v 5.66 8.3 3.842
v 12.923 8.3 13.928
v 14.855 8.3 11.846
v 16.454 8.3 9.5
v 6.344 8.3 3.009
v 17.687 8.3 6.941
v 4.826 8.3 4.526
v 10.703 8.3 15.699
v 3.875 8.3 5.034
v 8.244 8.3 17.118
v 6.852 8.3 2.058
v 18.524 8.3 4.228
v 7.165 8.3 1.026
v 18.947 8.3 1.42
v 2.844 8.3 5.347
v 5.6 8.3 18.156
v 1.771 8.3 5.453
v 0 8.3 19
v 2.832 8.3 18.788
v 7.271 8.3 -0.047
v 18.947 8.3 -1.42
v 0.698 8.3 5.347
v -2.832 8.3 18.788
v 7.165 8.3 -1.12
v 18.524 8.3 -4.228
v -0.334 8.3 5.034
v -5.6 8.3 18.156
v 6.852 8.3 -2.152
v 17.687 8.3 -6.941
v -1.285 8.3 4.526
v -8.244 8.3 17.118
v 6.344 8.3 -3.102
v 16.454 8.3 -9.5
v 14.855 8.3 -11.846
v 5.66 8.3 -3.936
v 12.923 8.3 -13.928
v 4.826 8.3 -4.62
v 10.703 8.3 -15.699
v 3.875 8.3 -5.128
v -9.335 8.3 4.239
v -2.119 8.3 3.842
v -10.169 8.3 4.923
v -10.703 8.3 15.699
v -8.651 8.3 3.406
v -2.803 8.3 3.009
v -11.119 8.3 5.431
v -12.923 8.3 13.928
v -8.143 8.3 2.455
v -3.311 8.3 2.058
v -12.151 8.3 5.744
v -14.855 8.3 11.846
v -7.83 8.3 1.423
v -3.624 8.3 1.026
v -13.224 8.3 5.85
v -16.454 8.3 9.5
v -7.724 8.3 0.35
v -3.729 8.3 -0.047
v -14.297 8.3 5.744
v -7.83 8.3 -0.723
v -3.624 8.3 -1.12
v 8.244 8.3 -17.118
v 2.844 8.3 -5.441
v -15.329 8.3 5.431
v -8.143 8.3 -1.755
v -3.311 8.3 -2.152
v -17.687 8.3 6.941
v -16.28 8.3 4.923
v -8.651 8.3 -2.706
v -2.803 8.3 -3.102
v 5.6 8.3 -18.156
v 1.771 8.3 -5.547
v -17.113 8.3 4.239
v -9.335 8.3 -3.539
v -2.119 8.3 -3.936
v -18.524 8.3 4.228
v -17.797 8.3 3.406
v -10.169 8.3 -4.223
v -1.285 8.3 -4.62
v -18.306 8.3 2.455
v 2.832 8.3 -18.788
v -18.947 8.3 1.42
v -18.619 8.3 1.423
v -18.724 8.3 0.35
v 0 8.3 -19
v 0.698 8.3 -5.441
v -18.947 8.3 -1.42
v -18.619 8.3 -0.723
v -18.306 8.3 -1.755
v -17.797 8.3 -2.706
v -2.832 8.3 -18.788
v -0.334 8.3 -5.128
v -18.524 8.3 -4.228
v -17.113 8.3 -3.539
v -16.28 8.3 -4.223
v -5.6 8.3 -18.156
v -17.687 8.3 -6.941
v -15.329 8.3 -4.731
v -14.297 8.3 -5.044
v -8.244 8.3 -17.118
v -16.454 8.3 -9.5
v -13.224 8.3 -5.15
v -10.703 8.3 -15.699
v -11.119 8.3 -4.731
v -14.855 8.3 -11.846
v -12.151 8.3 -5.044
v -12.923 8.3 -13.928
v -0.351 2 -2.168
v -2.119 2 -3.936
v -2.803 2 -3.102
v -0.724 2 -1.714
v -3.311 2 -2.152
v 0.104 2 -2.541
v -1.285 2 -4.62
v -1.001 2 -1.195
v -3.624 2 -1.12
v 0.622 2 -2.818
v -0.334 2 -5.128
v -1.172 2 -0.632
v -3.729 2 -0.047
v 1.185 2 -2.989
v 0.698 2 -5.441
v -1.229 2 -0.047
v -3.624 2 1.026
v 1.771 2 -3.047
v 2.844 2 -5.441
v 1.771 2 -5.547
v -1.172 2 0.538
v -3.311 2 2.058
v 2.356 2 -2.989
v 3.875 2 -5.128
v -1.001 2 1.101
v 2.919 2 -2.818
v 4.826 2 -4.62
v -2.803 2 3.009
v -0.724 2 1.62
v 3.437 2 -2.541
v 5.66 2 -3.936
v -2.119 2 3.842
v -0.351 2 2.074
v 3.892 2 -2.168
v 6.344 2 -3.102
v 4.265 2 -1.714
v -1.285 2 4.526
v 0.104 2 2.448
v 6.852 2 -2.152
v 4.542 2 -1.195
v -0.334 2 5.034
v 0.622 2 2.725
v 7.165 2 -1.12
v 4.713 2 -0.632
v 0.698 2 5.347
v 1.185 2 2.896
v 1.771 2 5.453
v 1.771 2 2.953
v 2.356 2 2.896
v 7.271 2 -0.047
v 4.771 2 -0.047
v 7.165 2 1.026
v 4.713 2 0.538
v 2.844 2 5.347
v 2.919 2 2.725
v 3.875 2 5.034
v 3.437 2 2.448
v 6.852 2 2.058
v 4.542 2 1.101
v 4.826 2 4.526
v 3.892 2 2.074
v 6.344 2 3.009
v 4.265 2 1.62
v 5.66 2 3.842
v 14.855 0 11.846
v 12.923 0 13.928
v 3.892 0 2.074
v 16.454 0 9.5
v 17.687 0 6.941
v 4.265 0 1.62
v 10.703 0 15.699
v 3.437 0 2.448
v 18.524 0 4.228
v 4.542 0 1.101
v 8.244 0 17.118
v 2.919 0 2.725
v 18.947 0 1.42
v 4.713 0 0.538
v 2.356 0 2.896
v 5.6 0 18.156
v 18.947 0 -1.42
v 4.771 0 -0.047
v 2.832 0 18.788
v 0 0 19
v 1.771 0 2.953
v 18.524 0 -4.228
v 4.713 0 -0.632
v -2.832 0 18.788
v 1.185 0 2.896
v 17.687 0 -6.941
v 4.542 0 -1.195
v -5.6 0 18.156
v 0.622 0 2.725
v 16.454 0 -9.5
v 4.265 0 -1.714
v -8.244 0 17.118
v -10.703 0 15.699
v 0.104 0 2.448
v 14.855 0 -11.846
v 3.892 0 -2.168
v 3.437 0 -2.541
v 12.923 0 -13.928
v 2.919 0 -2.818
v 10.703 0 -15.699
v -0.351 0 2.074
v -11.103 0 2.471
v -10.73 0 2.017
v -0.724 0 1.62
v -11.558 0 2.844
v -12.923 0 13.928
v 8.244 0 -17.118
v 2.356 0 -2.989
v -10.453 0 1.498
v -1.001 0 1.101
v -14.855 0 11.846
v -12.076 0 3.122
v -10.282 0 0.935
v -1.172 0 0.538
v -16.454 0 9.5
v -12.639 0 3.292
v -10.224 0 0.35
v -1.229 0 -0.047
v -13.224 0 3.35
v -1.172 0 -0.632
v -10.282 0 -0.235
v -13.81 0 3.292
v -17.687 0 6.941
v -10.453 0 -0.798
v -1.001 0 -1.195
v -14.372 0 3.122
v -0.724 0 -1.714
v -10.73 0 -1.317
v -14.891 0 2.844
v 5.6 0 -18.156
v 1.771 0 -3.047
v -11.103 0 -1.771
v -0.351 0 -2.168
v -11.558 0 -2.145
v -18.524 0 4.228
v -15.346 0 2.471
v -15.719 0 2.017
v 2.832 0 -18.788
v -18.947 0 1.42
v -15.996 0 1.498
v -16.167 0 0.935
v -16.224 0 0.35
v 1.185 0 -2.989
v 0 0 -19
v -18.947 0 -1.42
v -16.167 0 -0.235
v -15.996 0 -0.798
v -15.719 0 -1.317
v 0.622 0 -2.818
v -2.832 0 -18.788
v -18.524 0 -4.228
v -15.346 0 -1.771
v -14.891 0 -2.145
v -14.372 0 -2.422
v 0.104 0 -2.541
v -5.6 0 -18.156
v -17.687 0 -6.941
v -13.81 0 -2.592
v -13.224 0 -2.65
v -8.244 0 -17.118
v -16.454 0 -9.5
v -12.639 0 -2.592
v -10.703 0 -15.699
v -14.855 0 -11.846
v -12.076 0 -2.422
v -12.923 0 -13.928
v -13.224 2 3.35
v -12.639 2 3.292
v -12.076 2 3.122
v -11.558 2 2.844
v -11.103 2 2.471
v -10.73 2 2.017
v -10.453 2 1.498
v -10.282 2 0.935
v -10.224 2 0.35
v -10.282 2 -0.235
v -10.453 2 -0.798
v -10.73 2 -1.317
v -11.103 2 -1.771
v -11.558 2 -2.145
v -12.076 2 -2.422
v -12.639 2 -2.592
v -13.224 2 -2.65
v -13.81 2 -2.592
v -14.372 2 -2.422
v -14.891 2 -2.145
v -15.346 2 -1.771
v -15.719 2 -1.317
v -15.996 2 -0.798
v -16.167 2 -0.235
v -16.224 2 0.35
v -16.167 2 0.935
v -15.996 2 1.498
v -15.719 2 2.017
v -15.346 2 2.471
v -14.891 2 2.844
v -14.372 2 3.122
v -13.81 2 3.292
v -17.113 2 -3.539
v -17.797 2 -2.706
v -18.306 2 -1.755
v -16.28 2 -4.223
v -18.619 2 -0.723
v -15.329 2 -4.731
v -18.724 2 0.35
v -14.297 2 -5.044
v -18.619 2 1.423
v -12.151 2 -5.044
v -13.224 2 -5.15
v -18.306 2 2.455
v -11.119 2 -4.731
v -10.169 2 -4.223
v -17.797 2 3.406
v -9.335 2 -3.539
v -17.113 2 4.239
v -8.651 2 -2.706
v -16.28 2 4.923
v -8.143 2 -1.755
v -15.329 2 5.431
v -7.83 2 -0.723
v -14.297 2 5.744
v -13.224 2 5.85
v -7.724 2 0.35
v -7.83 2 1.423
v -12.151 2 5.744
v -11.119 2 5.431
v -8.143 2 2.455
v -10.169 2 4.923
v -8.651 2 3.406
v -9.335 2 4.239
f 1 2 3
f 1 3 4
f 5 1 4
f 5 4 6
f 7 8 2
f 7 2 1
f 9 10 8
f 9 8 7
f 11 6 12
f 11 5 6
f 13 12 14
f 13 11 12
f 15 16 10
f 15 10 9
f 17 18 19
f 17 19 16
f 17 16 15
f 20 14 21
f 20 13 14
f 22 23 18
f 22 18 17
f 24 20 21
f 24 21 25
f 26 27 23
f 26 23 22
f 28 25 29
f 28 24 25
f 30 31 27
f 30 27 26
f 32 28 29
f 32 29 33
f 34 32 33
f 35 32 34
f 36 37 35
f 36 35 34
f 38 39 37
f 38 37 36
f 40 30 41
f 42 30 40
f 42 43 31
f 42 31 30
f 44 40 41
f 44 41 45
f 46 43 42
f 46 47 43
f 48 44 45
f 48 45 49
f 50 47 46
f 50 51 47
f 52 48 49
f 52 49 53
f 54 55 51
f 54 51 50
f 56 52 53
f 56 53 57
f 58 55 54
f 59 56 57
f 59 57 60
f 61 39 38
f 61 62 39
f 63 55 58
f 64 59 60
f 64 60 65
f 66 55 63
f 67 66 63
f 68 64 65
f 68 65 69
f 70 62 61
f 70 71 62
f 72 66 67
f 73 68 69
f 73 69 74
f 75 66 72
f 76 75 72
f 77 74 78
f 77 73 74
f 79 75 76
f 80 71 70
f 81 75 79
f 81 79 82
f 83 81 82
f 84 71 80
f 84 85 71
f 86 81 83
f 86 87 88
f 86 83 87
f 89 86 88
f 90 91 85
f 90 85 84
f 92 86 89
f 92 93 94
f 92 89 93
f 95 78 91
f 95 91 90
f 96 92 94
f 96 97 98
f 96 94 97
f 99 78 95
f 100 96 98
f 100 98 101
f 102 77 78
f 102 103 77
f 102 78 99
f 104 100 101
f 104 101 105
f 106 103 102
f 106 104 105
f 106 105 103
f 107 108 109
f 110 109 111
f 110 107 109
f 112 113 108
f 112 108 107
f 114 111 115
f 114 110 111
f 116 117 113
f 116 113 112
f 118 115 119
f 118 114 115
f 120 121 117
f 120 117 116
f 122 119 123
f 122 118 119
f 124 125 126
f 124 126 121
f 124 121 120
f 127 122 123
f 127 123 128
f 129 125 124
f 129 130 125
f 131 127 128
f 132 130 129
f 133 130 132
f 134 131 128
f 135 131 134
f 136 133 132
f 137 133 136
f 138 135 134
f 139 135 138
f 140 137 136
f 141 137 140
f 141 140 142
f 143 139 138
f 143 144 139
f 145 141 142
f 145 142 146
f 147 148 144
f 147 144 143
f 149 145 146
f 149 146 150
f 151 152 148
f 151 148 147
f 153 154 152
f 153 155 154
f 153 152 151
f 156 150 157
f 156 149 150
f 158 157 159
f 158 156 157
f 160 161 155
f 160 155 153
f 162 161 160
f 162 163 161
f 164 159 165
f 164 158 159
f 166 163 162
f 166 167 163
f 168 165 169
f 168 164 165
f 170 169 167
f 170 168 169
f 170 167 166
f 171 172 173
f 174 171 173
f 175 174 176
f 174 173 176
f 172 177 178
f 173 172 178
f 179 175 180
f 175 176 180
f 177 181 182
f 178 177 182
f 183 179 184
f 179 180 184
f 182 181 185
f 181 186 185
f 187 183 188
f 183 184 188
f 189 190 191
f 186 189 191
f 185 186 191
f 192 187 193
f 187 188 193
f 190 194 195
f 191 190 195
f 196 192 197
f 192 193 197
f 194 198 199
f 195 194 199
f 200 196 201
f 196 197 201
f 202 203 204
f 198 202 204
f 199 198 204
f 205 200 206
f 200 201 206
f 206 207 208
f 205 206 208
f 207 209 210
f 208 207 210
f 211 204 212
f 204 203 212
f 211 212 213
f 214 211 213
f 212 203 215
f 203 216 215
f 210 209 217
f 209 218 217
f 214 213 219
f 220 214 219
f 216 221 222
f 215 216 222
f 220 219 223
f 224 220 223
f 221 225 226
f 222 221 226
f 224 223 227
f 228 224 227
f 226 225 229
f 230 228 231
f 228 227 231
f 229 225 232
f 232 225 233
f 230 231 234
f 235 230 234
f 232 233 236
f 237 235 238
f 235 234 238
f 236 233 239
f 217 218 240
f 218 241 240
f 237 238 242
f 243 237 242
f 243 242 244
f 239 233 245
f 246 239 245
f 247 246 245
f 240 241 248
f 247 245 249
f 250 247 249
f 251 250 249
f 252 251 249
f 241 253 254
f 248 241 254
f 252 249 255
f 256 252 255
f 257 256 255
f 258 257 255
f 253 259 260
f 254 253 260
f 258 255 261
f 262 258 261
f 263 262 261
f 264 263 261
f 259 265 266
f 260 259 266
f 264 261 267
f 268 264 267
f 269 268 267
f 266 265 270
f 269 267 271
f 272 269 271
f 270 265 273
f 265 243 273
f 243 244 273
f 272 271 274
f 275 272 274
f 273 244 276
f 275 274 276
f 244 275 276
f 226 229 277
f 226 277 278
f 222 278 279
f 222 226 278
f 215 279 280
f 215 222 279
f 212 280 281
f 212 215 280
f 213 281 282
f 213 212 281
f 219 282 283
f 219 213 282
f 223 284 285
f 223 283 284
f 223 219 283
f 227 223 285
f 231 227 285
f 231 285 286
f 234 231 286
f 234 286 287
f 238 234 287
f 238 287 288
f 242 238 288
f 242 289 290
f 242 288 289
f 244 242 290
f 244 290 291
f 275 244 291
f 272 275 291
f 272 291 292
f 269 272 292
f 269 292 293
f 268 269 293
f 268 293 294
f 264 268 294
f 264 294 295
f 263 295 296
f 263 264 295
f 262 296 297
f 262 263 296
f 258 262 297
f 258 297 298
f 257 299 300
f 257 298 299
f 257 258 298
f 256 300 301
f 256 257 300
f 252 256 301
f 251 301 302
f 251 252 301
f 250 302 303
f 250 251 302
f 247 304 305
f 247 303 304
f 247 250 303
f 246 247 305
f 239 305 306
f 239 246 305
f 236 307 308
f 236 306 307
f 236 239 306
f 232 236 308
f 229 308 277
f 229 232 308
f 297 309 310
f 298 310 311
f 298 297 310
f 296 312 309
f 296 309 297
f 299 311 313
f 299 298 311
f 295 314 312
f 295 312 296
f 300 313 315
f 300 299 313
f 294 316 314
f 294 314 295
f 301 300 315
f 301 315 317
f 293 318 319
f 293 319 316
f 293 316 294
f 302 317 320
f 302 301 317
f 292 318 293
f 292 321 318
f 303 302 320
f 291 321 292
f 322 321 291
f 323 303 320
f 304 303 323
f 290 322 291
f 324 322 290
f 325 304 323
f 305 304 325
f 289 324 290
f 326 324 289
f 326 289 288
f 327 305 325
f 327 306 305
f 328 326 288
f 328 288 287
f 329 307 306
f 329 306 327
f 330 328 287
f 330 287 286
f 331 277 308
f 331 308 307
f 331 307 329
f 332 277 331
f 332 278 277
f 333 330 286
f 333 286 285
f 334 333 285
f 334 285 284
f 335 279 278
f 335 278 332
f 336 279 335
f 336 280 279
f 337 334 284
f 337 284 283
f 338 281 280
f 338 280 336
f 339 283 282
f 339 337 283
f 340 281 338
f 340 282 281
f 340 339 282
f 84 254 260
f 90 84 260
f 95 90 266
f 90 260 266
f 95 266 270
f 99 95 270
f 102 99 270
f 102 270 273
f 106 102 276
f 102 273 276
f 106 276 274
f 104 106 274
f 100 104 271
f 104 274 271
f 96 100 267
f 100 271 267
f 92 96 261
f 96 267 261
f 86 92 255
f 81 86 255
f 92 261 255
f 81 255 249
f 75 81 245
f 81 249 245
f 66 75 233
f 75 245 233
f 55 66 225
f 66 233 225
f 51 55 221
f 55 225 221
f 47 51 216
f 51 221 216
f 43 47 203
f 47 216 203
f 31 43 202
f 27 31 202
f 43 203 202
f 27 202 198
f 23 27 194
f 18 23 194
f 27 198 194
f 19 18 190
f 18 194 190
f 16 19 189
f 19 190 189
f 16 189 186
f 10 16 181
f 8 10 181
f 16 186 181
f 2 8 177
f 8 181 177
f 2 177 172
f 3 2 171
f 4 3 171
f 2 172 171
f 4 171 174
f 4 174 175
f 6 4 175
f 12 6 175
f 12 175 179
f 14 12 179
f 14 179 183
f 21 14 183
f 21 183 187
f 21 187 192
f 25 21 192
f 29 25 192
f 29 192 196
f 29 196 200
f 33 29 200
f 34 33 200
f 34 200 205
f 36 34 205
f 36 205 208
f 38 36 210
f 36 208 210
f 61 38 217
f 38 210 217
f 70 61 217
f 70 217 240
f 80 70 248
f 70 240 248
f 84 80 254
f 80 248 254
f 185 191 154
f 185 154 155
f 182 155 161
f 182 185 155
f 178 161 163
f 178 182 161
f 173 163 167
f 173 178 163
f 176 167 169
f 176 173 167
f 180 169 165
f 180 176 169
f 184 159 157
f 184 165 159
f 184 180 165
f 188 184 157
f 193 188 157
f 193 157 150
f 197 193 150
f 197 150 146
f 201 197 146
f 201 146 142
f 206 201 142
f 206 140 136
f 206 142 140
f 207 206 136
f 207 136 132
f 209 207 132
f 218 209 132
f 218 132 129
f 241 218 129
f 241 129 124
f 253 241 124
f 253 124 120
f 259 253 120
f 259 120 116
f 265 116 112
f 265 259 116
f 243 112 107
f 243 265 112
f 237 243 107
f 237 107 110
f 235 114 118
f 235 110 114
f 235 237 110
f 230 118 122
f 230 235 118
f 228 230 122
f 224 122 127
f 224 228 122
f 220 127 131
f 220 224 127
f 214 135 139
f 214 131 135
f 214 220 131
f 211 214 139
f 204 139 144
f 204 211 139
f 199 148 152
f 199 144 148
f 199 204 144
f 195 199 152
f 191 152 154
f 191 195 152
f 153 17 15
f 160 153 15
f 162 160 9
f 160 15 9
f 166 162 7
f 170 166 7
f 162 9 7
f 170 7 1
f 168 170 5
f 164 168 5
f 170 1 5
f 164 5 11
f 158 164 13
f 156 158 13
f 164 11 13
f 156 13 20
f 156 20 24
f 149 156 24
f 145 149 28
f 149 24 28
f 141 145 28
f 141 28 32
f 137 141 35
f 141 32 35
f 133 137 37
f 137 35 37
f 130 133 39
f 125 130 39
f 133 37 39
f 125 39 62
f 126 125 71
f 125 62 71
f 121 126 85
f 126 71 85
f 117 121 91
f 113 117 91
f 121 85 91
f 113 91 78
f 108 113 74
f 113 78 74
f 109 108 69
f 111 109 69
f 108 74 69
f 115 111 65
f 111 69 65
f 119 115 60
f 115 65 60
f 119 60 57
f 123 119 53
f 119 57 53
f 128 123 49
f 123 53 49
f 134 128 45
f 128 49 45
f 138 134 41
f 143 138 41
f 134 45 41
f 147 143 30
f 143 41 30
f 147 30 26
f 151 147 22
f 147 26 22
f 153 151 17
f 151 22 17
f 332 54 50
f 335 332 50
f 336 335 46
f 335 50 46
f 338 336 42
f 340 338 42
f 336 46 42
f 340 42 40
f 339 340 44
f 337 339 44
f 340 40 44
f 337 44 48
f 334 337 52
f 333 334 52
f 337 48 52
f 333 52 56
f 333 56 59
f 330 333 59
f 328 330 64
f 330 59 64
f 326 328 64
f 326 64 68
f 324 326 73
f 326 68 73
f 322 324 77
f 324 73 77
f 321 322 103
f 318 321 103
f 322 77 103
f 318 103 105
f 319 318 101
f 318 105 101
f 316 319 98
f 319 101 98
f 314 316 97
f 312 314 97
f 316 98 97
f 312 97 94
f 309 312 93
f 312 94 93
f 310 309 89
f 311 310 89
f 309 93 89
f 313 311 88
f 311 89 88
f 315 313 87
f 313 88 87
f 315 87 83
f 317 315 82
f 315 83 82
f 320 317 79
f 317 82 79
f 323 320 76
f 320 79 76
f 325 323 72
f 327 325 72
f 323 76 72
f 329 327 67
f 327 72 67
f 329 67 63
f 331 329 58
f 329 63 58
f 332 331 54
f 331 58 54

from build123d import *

# Parameters (mm, degrees)
SZKIC1_R                        = 19
DODANIE_WYCI_GNI_CIE1_DEPTH     = 8.3
WYTNIJ_WYCI_GNI_CIE1_DEPTH      = 1036.988363246
WYTNIJ_WYCI_GNI_CIE1_DEPTH_BACK = 1036.988363246
SZKIC2_R                        = 3
WYTNIJ_WYCI_GNI_CIE2_START      = 8.3
SZKIC3_R                        = 5.5
WYTNIJ_WYCI_GNI_CIE2_DEPTH      = 6.3


with BuildPart() as part:
    # Szkic1 → Dodanie-wyciągnięcie1 (new body)
    with BuildSketch(Plane(origin=(0, 0, 0), x_dir=(1, 0, 0), z_dir=(0, 1, 0))):
        with Locations(Location((0, 0, 0), (0, 0, 90))):
            Circle(SZKIC1_R)
    extrude(amount=DODANIE_WYCI_GNI_CIE1_DEPTH)

    # Szkic2 → Wytnij-wyciągnięcie1 (cut, two sides: drawn at the far end of the back side and taken through both)
    with BuildSketch(Plane(origin=(141.849854944, -17.369665232, -1004.103260298), x_dir=(0.9996501322683511, 0, -0.02645019954306737), z_dir=(0, 1, 0)).offset(-WYTNIJ_WYCI_GNI_CIE1_DEPTH_BACK)):
        with Locations(Location((-181.587823501, -1000, 0), (0, 0, 268.484338434))):
            Circle(SZKIC2_R)
        with Locations(Location((-166.587823501, -1000, 0), (0, 0, 268.484338434))):
            Circle(SZKIC2_R)
    extrude(amount=WYTNIJ_WYCI_GNI_CIE1_DEPTH + WYTNIJ_WYCI_GNI_CIE1_DEPTH_BACK, mode=Mode.SUBTRACT)

    # Szkic3 → Wytnij-wyciągnięcie2 (cut)
    with BuildSketch(Plane(origin=(0, 0, 0), x_dir=(1, 0, 0), z_dir=(0, 1, 0)).offset(WYTNIJ_WYCI_GNI_CIE2_START)):
        with Locations(Location((-13.224237294, -0.349906136, 0), (0, 0, 270))):
            Circle(SZKIC3_R)
        with Locations(Location((1.77051469, 0.046846857, 0), (0, 0, 270))):
            Circle(SZKIC3_R)
    extrude(amount=-WYTNIJ_WYCI_GNI_CIE2_DEPTH, mode=Mode.SUBTRACT)


solid = part.part
